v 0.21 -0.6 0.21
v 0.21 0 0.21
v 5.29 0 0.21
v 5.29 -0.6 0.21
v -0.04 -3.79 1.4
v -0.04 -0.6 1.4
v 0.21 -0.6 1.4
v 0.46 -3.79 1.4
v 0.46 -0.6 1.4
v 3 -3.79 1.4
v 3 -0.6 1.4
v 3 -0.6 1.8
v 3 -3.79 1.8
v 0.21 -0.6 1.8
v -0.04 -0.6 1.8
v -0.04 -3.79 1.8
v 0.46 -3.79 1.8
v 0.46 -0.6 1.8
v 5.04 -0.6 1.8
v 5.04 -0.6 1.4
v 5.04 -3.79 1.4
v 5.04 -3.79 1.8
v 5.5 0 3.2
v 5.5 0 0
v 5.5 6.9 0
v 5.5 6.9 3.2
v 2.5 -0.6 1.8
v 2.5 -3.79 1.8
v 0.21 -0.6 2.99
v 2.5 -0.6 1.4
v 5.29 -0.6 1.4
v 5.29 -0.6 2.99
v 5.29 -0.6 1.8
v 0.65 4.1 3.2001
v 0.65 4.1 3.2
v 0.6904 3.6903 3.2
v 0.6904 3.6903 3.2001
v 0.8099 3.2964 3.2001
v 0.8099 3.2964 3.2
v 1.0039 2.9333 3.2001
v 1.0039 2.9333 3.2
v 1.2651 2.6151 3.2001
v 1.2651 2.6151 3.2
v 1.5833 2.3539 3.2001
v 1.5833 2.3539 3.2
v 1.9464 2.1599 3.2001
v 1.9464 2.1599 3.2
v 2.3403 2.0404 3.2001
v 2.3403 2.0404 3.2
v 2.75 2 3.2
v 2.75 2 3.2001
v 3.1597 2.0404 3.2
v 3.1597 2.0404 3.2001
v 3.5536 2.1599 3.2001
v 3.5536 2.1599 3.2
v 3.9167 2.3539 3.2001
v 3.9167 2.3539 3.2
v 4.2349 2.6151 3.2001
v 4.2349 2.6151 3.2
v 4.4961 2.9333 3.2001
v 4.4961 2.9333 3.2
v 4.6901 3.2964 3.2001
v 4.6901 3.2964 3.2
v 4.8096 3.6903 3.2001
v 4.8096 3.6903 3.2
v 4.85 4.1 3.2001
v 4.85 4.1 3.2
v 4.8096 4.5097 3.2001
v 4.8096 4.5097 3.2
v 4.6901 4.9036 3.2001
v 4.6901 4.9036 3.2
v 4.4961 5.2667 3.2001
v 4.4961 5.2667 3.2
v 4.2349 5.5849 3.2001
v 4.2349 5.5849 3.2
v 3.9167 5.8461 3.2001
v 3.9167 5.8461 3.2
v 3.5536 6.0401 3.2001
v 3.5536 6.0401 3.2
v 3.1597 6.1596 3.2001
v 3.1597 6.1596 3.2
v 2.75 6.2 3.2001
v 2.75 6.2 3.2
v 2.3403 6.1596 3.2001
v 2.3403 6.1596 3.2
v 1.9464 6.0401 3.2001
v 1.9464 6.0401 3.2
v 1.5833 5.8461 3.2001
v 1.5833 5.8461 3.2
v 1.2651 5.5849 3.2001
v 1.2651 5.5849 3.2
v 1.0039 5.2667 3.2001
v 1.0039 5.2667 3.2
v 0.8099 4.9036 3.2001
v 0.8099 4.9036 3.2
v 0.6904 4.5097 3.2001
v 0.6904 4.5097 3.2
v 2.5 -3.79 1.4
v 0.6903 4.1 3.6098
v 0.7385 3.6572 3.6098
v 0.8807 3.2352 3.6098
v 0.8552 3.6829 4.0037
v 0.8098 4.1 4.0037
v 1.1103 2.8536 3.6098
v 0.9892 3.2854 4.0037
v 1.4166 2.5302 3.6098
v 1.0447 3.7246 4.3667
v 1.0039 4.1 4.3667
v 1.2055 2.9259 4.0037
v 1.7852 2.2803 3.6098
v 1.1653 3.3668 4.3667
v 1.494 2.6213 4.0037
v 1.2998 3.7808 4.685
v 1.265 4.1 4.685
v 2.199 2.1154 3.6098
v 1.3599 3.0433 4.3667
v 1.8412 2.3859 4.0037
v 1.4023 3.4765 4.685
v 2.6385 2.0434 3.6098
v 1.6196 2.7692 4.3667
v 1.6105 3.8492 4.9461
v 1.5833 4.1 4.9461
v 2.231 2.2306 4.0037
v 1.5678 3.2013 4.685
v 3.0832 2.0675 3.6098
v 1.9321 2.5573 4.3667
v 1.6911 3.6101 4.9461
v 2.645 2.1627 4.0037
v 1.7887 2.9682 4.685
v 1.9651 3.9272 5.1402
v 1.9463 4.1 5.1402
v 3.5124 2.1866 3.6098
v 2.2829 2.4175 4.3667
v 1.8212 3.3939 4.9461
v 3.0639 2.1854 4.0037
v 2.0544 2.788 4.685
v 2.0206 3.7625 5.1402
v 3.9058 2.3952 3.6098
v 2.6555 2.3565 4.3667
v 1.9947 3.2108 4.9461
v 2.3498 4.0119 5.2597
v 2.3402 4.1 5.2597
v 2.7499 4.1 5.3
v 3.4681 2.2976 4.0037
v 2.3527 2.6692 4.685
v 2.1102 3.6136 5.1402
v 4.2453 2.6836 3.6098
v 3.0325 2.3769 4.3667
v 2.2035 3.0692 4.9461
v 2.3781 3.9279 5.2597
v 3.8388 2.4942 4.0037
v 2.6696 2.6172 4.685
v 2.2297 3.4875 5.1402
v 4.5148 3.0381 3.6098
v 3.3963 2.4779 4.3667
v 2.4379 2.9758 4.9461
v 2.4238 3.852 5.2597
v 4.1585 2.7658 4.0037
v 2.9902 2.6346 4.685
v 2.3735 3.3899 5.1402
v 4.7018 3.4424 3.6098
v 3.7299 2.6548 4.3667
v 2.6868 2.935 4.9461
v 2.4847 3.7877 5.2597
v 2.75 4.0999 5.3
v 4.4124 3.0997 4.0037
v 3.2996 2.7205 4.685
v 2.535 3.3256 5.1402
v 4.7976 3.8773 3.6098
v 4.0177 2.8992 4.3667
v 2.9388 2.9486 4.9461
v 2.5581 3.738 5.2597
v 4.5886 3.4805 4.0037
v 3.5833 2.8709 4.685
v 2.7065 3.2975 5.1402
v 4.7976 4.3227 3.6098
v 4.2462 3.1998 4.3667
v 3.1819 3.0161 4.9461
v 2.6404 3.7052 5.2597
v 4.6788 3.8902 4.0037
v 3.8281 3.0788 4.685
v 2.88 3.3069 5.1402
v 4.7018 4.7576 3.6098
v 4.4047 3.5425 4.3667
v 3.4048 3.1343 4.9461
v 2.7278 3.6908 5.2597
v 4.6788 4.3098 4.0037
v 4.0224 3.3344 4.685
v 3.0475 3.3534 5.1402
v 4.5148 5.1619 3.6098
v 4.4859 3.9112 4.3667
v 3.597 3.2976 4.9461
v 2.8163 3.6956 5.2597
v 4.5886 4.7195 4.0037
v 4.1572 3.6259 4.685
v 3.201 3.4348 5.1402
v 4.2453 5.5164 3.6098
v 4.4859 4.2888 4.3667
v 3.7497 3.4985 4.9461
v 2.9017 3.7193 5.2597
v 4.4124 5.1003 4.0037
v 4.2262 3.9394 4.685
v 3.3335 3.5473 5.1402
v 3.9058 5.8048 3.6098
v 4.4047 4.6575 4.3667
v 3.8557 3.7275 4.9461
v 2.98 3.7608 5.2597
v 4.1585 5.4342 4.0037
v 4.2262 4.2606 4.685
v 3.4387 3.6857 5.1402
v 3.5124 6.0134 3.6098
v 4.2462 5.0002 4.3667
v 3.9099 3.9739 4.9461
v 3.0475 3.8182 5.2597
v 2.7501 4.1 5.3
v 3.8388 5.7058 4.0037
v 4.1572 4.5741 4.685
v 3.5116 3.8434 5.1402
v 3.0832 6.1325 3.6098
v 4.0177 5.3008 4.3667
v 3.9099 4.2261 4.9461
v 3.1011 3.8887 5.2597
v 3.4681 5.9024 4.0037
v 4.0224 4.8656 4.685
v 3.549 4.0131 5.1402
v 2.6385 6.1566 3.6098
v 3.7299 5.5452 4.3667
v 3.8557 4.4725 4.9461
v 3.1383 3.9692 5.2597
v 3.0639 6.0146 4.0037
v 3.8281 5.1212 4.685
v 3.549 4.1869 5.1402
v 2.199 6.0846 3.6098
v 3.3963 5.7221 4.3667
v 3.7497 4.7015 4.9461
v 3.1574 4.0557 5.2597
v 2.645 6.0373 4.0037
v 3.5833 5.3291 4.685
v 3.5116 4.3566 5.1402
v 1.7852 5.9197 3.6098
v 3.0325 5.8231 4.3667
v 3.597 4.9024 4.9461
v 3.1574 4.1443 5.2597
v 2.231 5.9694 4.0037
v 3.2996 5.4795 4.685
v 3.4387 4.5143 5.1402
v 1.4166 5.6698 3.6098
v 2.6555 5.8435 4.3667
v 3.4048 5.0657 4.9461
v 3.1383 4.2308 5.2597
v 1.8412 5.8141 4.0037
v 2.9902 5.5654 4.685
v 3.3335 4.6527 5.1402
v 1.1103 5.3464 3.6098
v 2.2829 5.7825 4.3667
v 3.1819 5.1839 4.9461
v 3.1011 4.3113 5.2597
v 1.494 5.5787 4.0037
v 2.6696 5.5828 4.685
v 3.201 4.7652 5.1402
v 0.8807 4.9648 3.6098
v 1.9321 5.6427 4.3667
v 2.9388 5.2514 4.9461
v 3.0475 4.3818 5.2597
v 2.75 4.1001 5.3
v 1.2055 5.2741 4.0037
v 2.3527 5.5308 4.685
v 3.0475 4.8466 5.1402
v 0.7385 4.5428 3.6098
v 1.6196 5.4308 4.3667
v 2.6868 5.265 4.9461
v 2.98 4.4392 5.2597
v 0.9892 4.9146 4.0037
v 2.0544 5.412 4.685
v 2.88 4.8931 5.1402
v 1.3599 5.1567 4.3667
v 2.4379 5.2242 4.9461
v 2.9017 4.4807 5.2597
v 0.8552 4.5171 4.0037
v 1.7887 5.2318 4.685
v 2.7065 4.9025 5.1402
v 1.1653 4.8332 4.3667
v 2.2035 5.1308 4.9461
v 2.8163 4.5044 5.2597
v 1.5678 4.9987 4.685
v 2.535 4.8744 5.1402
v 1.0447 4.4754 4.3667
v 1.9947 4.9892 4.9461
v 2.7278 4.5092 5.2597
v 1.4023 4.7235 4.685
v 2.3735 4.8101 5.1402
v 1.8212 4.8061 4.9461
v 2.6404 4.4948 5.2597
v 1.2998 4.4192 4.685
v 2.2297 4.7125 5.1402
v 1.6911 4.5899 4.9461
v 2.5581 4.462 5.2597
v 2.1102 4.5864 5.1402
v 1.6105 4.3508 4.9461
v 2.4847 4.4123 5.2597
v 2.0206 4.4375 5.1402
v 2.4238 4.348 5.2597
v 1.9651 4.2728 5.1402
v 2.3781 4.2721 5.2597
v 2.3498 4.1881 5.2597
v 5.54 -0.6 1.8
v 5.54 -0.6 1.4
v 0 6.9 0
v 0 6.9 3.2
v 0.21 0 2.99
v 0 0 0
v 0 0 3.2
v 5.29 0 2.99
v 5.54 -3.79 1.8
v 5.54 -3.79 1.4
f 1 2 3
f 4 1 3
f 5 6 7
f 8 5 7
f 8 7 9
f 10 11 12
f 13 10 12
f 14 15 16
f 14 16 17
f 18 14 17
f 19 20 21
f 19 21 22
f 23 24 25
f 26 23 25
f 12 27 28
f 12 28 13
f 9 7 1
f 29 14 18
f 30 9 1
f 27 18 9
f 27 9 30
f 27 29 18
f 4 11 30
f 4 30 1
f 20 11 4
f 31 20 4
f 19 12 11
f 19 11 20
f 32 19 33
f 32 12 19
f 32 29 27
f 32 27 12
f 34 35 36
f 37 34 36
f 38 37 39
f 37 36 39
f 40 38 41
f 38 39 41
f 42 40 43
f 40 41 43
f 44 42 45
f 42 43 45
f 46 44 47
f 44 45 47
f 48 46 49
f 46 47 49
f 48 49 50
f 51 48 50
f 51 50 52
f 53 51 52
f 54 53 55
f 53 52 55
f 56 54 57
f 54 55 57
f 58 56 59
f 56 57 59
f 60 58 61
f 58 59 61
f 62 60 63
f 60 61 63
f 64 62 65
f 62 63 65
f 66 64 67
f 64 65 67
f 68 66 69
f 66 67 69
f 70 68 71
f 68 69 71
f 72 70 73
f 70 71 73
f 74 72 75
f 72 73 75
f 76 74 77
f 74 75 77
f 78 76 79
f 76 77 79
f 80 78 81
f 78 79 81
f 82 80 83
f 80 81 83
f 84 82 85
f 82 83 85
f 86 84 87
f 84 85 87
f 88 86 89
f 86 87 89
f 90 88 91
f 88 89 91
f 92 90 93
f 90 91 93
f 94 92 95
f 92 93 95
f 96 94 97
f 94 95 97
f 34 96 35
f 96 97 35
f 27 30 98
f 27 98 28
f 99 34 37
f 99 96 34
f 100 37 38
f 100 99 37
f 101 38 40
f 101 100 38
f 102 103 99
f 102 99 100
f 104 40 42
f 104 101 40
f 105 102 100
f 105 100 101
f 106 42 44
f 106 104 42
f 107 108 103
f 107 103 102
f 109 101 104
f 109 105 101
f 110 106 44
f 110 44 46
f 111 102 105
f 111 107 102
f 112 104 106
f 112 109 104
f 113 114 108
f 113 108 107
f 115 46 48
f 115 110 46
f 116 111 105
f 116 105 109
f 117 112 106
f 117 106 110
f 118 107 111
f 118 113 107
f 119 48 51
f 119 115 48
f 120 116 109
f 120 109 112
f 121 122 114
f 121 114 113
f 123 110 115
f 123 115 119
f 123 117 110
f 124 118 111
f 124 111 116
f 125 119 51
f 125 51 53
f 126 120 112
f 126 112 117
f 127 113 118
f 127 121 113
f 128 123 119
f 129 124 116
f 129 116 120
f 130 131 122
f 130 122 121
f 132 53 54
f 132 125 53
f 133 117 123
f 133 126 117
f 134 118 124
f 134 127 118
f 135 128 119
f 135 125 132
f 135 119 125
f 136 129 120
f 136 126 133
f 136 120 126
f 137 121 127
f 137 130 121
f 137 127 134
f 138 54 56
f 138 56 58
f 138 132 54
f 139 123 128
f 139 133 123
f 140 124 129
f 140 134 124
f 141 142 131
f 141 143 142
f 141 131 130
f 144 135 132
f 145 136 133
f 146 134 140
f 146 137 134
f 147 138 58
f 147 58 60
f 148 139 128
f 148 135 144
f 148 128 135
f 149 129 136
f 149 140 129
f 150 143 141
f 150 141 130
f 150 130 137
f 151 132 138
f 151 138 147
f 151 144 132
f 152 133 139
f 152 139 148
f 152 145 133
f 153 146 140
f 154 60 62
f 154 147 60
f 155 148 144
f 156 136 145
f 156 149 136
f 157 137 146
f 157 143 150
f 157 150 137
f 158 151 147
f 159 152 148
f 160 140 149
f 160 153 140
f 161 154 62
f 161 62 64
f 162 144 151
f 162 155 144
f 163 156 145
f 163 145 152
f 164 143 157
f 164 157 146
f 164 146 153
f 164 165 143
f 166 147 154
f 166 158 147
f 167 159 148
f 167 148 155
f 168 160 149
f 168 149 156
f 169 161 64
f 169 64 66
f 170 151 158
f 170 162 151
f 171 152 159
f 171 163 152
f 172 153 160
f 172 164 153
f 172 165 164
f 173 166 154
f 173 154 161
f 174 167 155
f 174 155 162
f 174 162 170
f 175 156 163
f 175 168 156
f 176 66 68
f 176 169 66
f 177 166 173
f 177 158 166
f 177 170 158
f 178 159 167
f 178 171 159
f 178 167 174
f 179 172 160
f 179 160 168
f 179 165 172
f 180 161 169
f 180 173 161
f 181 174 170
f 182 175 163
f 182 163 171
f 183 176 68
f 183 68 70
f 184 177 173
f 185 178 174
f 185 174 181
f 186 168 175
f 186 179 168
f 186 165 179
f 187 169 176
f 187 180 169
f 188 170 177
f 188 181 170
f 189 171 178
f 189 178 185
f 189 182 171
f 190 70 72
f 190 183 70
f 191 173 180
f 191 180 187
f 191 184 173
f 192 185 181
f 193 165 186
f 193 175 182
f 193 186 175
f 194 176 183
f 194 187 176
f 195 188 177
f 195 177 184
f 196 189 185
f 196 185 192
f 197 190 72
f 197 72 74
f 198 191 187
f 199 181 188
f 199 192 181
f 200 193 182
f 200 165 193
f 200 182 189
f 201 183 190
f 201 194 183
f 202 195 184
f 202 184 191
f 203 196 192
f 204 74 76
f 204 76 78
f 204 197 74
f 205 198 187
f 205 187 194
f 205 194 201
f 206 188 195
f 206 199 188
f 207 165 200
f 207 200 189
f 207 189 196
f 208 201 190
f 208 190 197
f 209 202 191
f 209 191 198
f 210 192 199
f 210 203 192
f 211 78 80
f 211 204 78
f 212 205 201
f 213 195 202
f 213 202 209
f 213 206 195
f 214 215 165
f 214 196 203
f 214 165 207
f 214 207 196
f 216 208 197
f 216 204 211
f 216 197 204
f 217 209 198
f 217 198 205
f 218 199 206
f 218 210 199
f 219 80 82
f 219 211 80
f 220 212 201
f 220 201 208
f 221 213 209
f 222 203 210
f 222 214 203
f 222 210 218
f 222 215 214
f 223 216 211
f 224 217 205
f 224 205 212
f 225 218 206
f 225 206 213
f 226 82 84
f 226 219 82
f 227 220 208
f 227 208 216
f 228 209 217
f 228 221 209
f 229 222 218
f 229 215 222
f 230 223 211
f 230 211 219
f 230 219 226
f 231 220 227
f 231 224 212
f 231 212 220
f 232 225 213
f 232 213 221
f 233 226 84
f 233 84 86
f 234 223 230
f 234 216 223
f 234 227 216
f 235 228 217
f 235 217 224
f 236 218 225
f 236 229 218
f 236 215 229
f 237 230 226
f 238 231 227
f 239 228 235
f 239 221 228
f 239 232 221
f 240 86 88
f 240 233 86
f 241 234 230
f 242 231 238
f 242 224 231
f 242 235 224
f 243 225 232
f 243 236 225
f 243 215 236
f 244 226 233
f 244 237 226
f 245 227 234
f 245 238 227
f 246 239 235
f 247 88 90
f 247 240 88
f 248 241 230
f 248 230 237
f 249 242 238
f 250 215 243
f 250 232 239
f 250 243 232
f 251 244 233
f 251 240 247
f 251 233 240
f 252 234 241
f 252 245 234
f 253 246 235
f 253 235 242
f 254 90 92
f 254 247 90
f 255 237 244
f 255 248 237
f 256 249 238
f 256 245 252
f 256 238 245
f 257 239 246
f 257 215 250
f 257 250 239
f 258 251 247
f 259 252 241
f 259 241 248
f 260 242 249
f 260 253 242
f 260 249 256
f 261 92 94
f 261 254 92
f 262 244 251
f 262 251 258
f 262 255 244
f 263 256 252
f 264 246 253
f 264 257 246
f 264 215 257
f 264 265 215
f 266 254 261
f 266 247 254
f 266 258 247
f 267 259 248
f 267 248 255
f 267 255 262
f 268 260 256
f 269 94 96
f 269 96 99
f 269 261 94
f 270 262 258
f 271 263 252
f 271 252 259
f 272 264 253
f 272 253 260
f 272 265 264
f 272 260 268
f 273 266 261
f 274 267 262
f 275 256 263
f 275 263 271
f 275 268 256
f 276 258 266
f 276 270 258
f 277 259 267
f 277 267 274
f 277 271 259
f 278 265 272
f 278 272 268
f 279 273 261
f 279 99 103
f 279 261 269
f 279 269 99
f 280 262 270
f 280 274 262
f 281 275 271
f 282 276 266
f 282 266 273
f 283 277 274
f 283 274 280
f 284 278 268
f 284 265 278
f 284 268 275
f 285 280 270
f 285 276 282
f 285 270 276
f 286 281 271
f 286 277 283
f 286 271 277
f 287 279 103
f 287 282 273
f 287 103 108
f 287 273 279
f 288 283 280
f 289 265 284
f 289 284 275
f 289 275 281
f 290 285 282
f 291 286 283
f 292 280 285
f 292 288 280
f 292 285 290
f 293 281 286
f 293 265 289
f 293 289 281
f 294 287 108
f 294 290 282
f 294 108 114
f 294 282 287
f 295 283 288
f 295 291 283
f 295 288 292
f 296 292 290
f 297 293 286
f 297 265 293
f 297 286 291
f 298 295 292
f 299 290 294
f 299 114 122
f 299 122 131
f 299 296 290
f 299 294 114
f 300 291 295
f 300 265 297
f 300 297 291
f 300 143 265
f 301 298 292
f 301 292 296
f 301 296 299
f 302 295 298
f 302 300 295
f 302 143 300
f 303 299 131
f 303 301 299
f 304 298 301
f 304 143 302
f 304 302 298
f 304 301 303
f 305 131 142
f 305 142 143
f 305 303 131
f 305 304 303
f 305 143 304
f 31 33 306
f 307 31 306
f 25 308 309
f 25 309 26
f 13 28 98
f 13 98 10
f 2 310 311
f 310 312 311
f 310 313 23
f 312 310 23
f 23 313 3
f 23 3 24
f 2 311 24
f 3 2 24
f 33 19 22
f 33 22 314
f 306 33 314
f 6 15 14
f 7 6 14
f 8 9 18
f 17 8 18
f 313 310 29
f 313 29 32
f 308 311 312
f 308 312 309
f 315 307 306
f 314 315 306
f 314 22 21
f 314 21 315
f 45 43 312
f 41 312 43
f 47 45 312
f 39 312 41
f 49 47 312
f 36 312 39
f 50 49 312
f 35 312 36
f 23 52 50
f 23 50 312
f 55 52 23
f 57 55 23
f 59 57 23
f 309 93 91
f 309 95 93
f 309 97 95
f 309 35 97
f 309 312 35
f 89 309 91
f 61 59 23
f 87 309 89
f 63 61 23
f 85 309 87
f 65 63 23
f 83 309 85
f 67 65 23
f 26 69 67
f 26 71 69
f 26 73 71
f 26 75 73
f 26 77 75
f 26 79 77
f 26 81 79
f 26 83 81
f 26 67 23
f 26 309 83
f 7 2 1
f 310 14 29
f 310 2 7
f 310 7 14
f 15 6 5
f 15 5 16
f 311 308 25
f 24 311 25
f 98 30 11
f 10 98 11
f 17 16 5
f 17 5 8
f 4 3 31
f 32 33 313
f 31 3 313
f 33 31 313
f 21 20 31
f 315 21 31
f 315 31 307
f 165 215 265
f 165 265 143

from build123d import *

# Parameters (mm, degrees)
SKETCH1_W           = 5.5
SKETCH1_H           = 6.9
BOSS_EXTRUDE1_DEPTH = 3.2
SKETCH4_R           = 2.1
BOSS_EXTRUDE2_DEPTH = 2.1
FILLET1_R           = 2.1
SKETCH5_W           = 5.08
SKETCH5_H           = 2.78
BOSS_EXTRUDE3_DEPTH = 0.6
SKETCH7_W           = 0.5
SKETCH7_H           = 0.4
BOSS_EXTRUDE5_DEPTH = 3.19
LPATTERN1_COUNT     = 2
LPATTERN1_PITCH     = 2.54
LPATTERN1_COL_COUNT = 2
LPATTERN1_COL_PITCH = 2.54


with BuildPart() as part:
    # Sketch1 → Boss-Extrude1 (new body)
    with BuildSketch(Plane.XY):
        with Locations((2.75, 3.45)):
            Rectangle(SKETCH1_W, SKETCH1_H)
    extrude(amount=BOSS_EXTRUDE1_DEPTH)

    # Sketch4 → Boss-Extrude2 (add)
    with BuildSketch(Plane.XY.offset(3.2)):
        with Locations(Location((2.75, 4.1, 0), (0, 0, 180))):
            Circle(SKETCH4_R)
    extrude(amount=BOSS_EXTRUDE2_DEPTH)

    # Fillet1
    fillet1_edges = [part.edges().sort_by_distance(p)[0] for p in [
        (4.85, 4.1, 5.3),
    ]]
    fillet(fillet1_edges, radius=FILLET1_R - 0.0001)  # a hair under: the kernel refuses the full size

    # Sketch5 → Boss-Extrude3 (add)
    with BuildSketch(Plane.XZ):
        with Locations((2.75, 1.6)):
            Rectangle(SKETCH5_W, SKETCH5_H)
    extrude(amount=BOSS_EXTRUDE3_DEPTH)

    # Sketch7 → Boss-Extrude5 (add)
    with BuildSketch(Plane.XZ.offset(0.6)):
        with Locations((2.75, 1.6)):
            Rectangle(SKETCH7_W, SKETCH7_H)
    boss_extrude5 = extrude(amount=BOSS_EXTRUDE5_DEPTH)

    # LPattern1: Boss-Extrude5 ×2
    with Locations(*[(-i * LPATTERN1_PITCH, 0, 0) for i in range(1, LPATTERN1_COUNT)]):
        add(boss_extrude5)

    # LPattern1 col: Boss-Extrude5 ×2
    with Locations(*[(i * LPATTERN1_COL_PITCH, 0, 0) for i in range(1, LPATTERN1_COL_COUNT)]):
        add(boss_extrude5)


solid = part.part
